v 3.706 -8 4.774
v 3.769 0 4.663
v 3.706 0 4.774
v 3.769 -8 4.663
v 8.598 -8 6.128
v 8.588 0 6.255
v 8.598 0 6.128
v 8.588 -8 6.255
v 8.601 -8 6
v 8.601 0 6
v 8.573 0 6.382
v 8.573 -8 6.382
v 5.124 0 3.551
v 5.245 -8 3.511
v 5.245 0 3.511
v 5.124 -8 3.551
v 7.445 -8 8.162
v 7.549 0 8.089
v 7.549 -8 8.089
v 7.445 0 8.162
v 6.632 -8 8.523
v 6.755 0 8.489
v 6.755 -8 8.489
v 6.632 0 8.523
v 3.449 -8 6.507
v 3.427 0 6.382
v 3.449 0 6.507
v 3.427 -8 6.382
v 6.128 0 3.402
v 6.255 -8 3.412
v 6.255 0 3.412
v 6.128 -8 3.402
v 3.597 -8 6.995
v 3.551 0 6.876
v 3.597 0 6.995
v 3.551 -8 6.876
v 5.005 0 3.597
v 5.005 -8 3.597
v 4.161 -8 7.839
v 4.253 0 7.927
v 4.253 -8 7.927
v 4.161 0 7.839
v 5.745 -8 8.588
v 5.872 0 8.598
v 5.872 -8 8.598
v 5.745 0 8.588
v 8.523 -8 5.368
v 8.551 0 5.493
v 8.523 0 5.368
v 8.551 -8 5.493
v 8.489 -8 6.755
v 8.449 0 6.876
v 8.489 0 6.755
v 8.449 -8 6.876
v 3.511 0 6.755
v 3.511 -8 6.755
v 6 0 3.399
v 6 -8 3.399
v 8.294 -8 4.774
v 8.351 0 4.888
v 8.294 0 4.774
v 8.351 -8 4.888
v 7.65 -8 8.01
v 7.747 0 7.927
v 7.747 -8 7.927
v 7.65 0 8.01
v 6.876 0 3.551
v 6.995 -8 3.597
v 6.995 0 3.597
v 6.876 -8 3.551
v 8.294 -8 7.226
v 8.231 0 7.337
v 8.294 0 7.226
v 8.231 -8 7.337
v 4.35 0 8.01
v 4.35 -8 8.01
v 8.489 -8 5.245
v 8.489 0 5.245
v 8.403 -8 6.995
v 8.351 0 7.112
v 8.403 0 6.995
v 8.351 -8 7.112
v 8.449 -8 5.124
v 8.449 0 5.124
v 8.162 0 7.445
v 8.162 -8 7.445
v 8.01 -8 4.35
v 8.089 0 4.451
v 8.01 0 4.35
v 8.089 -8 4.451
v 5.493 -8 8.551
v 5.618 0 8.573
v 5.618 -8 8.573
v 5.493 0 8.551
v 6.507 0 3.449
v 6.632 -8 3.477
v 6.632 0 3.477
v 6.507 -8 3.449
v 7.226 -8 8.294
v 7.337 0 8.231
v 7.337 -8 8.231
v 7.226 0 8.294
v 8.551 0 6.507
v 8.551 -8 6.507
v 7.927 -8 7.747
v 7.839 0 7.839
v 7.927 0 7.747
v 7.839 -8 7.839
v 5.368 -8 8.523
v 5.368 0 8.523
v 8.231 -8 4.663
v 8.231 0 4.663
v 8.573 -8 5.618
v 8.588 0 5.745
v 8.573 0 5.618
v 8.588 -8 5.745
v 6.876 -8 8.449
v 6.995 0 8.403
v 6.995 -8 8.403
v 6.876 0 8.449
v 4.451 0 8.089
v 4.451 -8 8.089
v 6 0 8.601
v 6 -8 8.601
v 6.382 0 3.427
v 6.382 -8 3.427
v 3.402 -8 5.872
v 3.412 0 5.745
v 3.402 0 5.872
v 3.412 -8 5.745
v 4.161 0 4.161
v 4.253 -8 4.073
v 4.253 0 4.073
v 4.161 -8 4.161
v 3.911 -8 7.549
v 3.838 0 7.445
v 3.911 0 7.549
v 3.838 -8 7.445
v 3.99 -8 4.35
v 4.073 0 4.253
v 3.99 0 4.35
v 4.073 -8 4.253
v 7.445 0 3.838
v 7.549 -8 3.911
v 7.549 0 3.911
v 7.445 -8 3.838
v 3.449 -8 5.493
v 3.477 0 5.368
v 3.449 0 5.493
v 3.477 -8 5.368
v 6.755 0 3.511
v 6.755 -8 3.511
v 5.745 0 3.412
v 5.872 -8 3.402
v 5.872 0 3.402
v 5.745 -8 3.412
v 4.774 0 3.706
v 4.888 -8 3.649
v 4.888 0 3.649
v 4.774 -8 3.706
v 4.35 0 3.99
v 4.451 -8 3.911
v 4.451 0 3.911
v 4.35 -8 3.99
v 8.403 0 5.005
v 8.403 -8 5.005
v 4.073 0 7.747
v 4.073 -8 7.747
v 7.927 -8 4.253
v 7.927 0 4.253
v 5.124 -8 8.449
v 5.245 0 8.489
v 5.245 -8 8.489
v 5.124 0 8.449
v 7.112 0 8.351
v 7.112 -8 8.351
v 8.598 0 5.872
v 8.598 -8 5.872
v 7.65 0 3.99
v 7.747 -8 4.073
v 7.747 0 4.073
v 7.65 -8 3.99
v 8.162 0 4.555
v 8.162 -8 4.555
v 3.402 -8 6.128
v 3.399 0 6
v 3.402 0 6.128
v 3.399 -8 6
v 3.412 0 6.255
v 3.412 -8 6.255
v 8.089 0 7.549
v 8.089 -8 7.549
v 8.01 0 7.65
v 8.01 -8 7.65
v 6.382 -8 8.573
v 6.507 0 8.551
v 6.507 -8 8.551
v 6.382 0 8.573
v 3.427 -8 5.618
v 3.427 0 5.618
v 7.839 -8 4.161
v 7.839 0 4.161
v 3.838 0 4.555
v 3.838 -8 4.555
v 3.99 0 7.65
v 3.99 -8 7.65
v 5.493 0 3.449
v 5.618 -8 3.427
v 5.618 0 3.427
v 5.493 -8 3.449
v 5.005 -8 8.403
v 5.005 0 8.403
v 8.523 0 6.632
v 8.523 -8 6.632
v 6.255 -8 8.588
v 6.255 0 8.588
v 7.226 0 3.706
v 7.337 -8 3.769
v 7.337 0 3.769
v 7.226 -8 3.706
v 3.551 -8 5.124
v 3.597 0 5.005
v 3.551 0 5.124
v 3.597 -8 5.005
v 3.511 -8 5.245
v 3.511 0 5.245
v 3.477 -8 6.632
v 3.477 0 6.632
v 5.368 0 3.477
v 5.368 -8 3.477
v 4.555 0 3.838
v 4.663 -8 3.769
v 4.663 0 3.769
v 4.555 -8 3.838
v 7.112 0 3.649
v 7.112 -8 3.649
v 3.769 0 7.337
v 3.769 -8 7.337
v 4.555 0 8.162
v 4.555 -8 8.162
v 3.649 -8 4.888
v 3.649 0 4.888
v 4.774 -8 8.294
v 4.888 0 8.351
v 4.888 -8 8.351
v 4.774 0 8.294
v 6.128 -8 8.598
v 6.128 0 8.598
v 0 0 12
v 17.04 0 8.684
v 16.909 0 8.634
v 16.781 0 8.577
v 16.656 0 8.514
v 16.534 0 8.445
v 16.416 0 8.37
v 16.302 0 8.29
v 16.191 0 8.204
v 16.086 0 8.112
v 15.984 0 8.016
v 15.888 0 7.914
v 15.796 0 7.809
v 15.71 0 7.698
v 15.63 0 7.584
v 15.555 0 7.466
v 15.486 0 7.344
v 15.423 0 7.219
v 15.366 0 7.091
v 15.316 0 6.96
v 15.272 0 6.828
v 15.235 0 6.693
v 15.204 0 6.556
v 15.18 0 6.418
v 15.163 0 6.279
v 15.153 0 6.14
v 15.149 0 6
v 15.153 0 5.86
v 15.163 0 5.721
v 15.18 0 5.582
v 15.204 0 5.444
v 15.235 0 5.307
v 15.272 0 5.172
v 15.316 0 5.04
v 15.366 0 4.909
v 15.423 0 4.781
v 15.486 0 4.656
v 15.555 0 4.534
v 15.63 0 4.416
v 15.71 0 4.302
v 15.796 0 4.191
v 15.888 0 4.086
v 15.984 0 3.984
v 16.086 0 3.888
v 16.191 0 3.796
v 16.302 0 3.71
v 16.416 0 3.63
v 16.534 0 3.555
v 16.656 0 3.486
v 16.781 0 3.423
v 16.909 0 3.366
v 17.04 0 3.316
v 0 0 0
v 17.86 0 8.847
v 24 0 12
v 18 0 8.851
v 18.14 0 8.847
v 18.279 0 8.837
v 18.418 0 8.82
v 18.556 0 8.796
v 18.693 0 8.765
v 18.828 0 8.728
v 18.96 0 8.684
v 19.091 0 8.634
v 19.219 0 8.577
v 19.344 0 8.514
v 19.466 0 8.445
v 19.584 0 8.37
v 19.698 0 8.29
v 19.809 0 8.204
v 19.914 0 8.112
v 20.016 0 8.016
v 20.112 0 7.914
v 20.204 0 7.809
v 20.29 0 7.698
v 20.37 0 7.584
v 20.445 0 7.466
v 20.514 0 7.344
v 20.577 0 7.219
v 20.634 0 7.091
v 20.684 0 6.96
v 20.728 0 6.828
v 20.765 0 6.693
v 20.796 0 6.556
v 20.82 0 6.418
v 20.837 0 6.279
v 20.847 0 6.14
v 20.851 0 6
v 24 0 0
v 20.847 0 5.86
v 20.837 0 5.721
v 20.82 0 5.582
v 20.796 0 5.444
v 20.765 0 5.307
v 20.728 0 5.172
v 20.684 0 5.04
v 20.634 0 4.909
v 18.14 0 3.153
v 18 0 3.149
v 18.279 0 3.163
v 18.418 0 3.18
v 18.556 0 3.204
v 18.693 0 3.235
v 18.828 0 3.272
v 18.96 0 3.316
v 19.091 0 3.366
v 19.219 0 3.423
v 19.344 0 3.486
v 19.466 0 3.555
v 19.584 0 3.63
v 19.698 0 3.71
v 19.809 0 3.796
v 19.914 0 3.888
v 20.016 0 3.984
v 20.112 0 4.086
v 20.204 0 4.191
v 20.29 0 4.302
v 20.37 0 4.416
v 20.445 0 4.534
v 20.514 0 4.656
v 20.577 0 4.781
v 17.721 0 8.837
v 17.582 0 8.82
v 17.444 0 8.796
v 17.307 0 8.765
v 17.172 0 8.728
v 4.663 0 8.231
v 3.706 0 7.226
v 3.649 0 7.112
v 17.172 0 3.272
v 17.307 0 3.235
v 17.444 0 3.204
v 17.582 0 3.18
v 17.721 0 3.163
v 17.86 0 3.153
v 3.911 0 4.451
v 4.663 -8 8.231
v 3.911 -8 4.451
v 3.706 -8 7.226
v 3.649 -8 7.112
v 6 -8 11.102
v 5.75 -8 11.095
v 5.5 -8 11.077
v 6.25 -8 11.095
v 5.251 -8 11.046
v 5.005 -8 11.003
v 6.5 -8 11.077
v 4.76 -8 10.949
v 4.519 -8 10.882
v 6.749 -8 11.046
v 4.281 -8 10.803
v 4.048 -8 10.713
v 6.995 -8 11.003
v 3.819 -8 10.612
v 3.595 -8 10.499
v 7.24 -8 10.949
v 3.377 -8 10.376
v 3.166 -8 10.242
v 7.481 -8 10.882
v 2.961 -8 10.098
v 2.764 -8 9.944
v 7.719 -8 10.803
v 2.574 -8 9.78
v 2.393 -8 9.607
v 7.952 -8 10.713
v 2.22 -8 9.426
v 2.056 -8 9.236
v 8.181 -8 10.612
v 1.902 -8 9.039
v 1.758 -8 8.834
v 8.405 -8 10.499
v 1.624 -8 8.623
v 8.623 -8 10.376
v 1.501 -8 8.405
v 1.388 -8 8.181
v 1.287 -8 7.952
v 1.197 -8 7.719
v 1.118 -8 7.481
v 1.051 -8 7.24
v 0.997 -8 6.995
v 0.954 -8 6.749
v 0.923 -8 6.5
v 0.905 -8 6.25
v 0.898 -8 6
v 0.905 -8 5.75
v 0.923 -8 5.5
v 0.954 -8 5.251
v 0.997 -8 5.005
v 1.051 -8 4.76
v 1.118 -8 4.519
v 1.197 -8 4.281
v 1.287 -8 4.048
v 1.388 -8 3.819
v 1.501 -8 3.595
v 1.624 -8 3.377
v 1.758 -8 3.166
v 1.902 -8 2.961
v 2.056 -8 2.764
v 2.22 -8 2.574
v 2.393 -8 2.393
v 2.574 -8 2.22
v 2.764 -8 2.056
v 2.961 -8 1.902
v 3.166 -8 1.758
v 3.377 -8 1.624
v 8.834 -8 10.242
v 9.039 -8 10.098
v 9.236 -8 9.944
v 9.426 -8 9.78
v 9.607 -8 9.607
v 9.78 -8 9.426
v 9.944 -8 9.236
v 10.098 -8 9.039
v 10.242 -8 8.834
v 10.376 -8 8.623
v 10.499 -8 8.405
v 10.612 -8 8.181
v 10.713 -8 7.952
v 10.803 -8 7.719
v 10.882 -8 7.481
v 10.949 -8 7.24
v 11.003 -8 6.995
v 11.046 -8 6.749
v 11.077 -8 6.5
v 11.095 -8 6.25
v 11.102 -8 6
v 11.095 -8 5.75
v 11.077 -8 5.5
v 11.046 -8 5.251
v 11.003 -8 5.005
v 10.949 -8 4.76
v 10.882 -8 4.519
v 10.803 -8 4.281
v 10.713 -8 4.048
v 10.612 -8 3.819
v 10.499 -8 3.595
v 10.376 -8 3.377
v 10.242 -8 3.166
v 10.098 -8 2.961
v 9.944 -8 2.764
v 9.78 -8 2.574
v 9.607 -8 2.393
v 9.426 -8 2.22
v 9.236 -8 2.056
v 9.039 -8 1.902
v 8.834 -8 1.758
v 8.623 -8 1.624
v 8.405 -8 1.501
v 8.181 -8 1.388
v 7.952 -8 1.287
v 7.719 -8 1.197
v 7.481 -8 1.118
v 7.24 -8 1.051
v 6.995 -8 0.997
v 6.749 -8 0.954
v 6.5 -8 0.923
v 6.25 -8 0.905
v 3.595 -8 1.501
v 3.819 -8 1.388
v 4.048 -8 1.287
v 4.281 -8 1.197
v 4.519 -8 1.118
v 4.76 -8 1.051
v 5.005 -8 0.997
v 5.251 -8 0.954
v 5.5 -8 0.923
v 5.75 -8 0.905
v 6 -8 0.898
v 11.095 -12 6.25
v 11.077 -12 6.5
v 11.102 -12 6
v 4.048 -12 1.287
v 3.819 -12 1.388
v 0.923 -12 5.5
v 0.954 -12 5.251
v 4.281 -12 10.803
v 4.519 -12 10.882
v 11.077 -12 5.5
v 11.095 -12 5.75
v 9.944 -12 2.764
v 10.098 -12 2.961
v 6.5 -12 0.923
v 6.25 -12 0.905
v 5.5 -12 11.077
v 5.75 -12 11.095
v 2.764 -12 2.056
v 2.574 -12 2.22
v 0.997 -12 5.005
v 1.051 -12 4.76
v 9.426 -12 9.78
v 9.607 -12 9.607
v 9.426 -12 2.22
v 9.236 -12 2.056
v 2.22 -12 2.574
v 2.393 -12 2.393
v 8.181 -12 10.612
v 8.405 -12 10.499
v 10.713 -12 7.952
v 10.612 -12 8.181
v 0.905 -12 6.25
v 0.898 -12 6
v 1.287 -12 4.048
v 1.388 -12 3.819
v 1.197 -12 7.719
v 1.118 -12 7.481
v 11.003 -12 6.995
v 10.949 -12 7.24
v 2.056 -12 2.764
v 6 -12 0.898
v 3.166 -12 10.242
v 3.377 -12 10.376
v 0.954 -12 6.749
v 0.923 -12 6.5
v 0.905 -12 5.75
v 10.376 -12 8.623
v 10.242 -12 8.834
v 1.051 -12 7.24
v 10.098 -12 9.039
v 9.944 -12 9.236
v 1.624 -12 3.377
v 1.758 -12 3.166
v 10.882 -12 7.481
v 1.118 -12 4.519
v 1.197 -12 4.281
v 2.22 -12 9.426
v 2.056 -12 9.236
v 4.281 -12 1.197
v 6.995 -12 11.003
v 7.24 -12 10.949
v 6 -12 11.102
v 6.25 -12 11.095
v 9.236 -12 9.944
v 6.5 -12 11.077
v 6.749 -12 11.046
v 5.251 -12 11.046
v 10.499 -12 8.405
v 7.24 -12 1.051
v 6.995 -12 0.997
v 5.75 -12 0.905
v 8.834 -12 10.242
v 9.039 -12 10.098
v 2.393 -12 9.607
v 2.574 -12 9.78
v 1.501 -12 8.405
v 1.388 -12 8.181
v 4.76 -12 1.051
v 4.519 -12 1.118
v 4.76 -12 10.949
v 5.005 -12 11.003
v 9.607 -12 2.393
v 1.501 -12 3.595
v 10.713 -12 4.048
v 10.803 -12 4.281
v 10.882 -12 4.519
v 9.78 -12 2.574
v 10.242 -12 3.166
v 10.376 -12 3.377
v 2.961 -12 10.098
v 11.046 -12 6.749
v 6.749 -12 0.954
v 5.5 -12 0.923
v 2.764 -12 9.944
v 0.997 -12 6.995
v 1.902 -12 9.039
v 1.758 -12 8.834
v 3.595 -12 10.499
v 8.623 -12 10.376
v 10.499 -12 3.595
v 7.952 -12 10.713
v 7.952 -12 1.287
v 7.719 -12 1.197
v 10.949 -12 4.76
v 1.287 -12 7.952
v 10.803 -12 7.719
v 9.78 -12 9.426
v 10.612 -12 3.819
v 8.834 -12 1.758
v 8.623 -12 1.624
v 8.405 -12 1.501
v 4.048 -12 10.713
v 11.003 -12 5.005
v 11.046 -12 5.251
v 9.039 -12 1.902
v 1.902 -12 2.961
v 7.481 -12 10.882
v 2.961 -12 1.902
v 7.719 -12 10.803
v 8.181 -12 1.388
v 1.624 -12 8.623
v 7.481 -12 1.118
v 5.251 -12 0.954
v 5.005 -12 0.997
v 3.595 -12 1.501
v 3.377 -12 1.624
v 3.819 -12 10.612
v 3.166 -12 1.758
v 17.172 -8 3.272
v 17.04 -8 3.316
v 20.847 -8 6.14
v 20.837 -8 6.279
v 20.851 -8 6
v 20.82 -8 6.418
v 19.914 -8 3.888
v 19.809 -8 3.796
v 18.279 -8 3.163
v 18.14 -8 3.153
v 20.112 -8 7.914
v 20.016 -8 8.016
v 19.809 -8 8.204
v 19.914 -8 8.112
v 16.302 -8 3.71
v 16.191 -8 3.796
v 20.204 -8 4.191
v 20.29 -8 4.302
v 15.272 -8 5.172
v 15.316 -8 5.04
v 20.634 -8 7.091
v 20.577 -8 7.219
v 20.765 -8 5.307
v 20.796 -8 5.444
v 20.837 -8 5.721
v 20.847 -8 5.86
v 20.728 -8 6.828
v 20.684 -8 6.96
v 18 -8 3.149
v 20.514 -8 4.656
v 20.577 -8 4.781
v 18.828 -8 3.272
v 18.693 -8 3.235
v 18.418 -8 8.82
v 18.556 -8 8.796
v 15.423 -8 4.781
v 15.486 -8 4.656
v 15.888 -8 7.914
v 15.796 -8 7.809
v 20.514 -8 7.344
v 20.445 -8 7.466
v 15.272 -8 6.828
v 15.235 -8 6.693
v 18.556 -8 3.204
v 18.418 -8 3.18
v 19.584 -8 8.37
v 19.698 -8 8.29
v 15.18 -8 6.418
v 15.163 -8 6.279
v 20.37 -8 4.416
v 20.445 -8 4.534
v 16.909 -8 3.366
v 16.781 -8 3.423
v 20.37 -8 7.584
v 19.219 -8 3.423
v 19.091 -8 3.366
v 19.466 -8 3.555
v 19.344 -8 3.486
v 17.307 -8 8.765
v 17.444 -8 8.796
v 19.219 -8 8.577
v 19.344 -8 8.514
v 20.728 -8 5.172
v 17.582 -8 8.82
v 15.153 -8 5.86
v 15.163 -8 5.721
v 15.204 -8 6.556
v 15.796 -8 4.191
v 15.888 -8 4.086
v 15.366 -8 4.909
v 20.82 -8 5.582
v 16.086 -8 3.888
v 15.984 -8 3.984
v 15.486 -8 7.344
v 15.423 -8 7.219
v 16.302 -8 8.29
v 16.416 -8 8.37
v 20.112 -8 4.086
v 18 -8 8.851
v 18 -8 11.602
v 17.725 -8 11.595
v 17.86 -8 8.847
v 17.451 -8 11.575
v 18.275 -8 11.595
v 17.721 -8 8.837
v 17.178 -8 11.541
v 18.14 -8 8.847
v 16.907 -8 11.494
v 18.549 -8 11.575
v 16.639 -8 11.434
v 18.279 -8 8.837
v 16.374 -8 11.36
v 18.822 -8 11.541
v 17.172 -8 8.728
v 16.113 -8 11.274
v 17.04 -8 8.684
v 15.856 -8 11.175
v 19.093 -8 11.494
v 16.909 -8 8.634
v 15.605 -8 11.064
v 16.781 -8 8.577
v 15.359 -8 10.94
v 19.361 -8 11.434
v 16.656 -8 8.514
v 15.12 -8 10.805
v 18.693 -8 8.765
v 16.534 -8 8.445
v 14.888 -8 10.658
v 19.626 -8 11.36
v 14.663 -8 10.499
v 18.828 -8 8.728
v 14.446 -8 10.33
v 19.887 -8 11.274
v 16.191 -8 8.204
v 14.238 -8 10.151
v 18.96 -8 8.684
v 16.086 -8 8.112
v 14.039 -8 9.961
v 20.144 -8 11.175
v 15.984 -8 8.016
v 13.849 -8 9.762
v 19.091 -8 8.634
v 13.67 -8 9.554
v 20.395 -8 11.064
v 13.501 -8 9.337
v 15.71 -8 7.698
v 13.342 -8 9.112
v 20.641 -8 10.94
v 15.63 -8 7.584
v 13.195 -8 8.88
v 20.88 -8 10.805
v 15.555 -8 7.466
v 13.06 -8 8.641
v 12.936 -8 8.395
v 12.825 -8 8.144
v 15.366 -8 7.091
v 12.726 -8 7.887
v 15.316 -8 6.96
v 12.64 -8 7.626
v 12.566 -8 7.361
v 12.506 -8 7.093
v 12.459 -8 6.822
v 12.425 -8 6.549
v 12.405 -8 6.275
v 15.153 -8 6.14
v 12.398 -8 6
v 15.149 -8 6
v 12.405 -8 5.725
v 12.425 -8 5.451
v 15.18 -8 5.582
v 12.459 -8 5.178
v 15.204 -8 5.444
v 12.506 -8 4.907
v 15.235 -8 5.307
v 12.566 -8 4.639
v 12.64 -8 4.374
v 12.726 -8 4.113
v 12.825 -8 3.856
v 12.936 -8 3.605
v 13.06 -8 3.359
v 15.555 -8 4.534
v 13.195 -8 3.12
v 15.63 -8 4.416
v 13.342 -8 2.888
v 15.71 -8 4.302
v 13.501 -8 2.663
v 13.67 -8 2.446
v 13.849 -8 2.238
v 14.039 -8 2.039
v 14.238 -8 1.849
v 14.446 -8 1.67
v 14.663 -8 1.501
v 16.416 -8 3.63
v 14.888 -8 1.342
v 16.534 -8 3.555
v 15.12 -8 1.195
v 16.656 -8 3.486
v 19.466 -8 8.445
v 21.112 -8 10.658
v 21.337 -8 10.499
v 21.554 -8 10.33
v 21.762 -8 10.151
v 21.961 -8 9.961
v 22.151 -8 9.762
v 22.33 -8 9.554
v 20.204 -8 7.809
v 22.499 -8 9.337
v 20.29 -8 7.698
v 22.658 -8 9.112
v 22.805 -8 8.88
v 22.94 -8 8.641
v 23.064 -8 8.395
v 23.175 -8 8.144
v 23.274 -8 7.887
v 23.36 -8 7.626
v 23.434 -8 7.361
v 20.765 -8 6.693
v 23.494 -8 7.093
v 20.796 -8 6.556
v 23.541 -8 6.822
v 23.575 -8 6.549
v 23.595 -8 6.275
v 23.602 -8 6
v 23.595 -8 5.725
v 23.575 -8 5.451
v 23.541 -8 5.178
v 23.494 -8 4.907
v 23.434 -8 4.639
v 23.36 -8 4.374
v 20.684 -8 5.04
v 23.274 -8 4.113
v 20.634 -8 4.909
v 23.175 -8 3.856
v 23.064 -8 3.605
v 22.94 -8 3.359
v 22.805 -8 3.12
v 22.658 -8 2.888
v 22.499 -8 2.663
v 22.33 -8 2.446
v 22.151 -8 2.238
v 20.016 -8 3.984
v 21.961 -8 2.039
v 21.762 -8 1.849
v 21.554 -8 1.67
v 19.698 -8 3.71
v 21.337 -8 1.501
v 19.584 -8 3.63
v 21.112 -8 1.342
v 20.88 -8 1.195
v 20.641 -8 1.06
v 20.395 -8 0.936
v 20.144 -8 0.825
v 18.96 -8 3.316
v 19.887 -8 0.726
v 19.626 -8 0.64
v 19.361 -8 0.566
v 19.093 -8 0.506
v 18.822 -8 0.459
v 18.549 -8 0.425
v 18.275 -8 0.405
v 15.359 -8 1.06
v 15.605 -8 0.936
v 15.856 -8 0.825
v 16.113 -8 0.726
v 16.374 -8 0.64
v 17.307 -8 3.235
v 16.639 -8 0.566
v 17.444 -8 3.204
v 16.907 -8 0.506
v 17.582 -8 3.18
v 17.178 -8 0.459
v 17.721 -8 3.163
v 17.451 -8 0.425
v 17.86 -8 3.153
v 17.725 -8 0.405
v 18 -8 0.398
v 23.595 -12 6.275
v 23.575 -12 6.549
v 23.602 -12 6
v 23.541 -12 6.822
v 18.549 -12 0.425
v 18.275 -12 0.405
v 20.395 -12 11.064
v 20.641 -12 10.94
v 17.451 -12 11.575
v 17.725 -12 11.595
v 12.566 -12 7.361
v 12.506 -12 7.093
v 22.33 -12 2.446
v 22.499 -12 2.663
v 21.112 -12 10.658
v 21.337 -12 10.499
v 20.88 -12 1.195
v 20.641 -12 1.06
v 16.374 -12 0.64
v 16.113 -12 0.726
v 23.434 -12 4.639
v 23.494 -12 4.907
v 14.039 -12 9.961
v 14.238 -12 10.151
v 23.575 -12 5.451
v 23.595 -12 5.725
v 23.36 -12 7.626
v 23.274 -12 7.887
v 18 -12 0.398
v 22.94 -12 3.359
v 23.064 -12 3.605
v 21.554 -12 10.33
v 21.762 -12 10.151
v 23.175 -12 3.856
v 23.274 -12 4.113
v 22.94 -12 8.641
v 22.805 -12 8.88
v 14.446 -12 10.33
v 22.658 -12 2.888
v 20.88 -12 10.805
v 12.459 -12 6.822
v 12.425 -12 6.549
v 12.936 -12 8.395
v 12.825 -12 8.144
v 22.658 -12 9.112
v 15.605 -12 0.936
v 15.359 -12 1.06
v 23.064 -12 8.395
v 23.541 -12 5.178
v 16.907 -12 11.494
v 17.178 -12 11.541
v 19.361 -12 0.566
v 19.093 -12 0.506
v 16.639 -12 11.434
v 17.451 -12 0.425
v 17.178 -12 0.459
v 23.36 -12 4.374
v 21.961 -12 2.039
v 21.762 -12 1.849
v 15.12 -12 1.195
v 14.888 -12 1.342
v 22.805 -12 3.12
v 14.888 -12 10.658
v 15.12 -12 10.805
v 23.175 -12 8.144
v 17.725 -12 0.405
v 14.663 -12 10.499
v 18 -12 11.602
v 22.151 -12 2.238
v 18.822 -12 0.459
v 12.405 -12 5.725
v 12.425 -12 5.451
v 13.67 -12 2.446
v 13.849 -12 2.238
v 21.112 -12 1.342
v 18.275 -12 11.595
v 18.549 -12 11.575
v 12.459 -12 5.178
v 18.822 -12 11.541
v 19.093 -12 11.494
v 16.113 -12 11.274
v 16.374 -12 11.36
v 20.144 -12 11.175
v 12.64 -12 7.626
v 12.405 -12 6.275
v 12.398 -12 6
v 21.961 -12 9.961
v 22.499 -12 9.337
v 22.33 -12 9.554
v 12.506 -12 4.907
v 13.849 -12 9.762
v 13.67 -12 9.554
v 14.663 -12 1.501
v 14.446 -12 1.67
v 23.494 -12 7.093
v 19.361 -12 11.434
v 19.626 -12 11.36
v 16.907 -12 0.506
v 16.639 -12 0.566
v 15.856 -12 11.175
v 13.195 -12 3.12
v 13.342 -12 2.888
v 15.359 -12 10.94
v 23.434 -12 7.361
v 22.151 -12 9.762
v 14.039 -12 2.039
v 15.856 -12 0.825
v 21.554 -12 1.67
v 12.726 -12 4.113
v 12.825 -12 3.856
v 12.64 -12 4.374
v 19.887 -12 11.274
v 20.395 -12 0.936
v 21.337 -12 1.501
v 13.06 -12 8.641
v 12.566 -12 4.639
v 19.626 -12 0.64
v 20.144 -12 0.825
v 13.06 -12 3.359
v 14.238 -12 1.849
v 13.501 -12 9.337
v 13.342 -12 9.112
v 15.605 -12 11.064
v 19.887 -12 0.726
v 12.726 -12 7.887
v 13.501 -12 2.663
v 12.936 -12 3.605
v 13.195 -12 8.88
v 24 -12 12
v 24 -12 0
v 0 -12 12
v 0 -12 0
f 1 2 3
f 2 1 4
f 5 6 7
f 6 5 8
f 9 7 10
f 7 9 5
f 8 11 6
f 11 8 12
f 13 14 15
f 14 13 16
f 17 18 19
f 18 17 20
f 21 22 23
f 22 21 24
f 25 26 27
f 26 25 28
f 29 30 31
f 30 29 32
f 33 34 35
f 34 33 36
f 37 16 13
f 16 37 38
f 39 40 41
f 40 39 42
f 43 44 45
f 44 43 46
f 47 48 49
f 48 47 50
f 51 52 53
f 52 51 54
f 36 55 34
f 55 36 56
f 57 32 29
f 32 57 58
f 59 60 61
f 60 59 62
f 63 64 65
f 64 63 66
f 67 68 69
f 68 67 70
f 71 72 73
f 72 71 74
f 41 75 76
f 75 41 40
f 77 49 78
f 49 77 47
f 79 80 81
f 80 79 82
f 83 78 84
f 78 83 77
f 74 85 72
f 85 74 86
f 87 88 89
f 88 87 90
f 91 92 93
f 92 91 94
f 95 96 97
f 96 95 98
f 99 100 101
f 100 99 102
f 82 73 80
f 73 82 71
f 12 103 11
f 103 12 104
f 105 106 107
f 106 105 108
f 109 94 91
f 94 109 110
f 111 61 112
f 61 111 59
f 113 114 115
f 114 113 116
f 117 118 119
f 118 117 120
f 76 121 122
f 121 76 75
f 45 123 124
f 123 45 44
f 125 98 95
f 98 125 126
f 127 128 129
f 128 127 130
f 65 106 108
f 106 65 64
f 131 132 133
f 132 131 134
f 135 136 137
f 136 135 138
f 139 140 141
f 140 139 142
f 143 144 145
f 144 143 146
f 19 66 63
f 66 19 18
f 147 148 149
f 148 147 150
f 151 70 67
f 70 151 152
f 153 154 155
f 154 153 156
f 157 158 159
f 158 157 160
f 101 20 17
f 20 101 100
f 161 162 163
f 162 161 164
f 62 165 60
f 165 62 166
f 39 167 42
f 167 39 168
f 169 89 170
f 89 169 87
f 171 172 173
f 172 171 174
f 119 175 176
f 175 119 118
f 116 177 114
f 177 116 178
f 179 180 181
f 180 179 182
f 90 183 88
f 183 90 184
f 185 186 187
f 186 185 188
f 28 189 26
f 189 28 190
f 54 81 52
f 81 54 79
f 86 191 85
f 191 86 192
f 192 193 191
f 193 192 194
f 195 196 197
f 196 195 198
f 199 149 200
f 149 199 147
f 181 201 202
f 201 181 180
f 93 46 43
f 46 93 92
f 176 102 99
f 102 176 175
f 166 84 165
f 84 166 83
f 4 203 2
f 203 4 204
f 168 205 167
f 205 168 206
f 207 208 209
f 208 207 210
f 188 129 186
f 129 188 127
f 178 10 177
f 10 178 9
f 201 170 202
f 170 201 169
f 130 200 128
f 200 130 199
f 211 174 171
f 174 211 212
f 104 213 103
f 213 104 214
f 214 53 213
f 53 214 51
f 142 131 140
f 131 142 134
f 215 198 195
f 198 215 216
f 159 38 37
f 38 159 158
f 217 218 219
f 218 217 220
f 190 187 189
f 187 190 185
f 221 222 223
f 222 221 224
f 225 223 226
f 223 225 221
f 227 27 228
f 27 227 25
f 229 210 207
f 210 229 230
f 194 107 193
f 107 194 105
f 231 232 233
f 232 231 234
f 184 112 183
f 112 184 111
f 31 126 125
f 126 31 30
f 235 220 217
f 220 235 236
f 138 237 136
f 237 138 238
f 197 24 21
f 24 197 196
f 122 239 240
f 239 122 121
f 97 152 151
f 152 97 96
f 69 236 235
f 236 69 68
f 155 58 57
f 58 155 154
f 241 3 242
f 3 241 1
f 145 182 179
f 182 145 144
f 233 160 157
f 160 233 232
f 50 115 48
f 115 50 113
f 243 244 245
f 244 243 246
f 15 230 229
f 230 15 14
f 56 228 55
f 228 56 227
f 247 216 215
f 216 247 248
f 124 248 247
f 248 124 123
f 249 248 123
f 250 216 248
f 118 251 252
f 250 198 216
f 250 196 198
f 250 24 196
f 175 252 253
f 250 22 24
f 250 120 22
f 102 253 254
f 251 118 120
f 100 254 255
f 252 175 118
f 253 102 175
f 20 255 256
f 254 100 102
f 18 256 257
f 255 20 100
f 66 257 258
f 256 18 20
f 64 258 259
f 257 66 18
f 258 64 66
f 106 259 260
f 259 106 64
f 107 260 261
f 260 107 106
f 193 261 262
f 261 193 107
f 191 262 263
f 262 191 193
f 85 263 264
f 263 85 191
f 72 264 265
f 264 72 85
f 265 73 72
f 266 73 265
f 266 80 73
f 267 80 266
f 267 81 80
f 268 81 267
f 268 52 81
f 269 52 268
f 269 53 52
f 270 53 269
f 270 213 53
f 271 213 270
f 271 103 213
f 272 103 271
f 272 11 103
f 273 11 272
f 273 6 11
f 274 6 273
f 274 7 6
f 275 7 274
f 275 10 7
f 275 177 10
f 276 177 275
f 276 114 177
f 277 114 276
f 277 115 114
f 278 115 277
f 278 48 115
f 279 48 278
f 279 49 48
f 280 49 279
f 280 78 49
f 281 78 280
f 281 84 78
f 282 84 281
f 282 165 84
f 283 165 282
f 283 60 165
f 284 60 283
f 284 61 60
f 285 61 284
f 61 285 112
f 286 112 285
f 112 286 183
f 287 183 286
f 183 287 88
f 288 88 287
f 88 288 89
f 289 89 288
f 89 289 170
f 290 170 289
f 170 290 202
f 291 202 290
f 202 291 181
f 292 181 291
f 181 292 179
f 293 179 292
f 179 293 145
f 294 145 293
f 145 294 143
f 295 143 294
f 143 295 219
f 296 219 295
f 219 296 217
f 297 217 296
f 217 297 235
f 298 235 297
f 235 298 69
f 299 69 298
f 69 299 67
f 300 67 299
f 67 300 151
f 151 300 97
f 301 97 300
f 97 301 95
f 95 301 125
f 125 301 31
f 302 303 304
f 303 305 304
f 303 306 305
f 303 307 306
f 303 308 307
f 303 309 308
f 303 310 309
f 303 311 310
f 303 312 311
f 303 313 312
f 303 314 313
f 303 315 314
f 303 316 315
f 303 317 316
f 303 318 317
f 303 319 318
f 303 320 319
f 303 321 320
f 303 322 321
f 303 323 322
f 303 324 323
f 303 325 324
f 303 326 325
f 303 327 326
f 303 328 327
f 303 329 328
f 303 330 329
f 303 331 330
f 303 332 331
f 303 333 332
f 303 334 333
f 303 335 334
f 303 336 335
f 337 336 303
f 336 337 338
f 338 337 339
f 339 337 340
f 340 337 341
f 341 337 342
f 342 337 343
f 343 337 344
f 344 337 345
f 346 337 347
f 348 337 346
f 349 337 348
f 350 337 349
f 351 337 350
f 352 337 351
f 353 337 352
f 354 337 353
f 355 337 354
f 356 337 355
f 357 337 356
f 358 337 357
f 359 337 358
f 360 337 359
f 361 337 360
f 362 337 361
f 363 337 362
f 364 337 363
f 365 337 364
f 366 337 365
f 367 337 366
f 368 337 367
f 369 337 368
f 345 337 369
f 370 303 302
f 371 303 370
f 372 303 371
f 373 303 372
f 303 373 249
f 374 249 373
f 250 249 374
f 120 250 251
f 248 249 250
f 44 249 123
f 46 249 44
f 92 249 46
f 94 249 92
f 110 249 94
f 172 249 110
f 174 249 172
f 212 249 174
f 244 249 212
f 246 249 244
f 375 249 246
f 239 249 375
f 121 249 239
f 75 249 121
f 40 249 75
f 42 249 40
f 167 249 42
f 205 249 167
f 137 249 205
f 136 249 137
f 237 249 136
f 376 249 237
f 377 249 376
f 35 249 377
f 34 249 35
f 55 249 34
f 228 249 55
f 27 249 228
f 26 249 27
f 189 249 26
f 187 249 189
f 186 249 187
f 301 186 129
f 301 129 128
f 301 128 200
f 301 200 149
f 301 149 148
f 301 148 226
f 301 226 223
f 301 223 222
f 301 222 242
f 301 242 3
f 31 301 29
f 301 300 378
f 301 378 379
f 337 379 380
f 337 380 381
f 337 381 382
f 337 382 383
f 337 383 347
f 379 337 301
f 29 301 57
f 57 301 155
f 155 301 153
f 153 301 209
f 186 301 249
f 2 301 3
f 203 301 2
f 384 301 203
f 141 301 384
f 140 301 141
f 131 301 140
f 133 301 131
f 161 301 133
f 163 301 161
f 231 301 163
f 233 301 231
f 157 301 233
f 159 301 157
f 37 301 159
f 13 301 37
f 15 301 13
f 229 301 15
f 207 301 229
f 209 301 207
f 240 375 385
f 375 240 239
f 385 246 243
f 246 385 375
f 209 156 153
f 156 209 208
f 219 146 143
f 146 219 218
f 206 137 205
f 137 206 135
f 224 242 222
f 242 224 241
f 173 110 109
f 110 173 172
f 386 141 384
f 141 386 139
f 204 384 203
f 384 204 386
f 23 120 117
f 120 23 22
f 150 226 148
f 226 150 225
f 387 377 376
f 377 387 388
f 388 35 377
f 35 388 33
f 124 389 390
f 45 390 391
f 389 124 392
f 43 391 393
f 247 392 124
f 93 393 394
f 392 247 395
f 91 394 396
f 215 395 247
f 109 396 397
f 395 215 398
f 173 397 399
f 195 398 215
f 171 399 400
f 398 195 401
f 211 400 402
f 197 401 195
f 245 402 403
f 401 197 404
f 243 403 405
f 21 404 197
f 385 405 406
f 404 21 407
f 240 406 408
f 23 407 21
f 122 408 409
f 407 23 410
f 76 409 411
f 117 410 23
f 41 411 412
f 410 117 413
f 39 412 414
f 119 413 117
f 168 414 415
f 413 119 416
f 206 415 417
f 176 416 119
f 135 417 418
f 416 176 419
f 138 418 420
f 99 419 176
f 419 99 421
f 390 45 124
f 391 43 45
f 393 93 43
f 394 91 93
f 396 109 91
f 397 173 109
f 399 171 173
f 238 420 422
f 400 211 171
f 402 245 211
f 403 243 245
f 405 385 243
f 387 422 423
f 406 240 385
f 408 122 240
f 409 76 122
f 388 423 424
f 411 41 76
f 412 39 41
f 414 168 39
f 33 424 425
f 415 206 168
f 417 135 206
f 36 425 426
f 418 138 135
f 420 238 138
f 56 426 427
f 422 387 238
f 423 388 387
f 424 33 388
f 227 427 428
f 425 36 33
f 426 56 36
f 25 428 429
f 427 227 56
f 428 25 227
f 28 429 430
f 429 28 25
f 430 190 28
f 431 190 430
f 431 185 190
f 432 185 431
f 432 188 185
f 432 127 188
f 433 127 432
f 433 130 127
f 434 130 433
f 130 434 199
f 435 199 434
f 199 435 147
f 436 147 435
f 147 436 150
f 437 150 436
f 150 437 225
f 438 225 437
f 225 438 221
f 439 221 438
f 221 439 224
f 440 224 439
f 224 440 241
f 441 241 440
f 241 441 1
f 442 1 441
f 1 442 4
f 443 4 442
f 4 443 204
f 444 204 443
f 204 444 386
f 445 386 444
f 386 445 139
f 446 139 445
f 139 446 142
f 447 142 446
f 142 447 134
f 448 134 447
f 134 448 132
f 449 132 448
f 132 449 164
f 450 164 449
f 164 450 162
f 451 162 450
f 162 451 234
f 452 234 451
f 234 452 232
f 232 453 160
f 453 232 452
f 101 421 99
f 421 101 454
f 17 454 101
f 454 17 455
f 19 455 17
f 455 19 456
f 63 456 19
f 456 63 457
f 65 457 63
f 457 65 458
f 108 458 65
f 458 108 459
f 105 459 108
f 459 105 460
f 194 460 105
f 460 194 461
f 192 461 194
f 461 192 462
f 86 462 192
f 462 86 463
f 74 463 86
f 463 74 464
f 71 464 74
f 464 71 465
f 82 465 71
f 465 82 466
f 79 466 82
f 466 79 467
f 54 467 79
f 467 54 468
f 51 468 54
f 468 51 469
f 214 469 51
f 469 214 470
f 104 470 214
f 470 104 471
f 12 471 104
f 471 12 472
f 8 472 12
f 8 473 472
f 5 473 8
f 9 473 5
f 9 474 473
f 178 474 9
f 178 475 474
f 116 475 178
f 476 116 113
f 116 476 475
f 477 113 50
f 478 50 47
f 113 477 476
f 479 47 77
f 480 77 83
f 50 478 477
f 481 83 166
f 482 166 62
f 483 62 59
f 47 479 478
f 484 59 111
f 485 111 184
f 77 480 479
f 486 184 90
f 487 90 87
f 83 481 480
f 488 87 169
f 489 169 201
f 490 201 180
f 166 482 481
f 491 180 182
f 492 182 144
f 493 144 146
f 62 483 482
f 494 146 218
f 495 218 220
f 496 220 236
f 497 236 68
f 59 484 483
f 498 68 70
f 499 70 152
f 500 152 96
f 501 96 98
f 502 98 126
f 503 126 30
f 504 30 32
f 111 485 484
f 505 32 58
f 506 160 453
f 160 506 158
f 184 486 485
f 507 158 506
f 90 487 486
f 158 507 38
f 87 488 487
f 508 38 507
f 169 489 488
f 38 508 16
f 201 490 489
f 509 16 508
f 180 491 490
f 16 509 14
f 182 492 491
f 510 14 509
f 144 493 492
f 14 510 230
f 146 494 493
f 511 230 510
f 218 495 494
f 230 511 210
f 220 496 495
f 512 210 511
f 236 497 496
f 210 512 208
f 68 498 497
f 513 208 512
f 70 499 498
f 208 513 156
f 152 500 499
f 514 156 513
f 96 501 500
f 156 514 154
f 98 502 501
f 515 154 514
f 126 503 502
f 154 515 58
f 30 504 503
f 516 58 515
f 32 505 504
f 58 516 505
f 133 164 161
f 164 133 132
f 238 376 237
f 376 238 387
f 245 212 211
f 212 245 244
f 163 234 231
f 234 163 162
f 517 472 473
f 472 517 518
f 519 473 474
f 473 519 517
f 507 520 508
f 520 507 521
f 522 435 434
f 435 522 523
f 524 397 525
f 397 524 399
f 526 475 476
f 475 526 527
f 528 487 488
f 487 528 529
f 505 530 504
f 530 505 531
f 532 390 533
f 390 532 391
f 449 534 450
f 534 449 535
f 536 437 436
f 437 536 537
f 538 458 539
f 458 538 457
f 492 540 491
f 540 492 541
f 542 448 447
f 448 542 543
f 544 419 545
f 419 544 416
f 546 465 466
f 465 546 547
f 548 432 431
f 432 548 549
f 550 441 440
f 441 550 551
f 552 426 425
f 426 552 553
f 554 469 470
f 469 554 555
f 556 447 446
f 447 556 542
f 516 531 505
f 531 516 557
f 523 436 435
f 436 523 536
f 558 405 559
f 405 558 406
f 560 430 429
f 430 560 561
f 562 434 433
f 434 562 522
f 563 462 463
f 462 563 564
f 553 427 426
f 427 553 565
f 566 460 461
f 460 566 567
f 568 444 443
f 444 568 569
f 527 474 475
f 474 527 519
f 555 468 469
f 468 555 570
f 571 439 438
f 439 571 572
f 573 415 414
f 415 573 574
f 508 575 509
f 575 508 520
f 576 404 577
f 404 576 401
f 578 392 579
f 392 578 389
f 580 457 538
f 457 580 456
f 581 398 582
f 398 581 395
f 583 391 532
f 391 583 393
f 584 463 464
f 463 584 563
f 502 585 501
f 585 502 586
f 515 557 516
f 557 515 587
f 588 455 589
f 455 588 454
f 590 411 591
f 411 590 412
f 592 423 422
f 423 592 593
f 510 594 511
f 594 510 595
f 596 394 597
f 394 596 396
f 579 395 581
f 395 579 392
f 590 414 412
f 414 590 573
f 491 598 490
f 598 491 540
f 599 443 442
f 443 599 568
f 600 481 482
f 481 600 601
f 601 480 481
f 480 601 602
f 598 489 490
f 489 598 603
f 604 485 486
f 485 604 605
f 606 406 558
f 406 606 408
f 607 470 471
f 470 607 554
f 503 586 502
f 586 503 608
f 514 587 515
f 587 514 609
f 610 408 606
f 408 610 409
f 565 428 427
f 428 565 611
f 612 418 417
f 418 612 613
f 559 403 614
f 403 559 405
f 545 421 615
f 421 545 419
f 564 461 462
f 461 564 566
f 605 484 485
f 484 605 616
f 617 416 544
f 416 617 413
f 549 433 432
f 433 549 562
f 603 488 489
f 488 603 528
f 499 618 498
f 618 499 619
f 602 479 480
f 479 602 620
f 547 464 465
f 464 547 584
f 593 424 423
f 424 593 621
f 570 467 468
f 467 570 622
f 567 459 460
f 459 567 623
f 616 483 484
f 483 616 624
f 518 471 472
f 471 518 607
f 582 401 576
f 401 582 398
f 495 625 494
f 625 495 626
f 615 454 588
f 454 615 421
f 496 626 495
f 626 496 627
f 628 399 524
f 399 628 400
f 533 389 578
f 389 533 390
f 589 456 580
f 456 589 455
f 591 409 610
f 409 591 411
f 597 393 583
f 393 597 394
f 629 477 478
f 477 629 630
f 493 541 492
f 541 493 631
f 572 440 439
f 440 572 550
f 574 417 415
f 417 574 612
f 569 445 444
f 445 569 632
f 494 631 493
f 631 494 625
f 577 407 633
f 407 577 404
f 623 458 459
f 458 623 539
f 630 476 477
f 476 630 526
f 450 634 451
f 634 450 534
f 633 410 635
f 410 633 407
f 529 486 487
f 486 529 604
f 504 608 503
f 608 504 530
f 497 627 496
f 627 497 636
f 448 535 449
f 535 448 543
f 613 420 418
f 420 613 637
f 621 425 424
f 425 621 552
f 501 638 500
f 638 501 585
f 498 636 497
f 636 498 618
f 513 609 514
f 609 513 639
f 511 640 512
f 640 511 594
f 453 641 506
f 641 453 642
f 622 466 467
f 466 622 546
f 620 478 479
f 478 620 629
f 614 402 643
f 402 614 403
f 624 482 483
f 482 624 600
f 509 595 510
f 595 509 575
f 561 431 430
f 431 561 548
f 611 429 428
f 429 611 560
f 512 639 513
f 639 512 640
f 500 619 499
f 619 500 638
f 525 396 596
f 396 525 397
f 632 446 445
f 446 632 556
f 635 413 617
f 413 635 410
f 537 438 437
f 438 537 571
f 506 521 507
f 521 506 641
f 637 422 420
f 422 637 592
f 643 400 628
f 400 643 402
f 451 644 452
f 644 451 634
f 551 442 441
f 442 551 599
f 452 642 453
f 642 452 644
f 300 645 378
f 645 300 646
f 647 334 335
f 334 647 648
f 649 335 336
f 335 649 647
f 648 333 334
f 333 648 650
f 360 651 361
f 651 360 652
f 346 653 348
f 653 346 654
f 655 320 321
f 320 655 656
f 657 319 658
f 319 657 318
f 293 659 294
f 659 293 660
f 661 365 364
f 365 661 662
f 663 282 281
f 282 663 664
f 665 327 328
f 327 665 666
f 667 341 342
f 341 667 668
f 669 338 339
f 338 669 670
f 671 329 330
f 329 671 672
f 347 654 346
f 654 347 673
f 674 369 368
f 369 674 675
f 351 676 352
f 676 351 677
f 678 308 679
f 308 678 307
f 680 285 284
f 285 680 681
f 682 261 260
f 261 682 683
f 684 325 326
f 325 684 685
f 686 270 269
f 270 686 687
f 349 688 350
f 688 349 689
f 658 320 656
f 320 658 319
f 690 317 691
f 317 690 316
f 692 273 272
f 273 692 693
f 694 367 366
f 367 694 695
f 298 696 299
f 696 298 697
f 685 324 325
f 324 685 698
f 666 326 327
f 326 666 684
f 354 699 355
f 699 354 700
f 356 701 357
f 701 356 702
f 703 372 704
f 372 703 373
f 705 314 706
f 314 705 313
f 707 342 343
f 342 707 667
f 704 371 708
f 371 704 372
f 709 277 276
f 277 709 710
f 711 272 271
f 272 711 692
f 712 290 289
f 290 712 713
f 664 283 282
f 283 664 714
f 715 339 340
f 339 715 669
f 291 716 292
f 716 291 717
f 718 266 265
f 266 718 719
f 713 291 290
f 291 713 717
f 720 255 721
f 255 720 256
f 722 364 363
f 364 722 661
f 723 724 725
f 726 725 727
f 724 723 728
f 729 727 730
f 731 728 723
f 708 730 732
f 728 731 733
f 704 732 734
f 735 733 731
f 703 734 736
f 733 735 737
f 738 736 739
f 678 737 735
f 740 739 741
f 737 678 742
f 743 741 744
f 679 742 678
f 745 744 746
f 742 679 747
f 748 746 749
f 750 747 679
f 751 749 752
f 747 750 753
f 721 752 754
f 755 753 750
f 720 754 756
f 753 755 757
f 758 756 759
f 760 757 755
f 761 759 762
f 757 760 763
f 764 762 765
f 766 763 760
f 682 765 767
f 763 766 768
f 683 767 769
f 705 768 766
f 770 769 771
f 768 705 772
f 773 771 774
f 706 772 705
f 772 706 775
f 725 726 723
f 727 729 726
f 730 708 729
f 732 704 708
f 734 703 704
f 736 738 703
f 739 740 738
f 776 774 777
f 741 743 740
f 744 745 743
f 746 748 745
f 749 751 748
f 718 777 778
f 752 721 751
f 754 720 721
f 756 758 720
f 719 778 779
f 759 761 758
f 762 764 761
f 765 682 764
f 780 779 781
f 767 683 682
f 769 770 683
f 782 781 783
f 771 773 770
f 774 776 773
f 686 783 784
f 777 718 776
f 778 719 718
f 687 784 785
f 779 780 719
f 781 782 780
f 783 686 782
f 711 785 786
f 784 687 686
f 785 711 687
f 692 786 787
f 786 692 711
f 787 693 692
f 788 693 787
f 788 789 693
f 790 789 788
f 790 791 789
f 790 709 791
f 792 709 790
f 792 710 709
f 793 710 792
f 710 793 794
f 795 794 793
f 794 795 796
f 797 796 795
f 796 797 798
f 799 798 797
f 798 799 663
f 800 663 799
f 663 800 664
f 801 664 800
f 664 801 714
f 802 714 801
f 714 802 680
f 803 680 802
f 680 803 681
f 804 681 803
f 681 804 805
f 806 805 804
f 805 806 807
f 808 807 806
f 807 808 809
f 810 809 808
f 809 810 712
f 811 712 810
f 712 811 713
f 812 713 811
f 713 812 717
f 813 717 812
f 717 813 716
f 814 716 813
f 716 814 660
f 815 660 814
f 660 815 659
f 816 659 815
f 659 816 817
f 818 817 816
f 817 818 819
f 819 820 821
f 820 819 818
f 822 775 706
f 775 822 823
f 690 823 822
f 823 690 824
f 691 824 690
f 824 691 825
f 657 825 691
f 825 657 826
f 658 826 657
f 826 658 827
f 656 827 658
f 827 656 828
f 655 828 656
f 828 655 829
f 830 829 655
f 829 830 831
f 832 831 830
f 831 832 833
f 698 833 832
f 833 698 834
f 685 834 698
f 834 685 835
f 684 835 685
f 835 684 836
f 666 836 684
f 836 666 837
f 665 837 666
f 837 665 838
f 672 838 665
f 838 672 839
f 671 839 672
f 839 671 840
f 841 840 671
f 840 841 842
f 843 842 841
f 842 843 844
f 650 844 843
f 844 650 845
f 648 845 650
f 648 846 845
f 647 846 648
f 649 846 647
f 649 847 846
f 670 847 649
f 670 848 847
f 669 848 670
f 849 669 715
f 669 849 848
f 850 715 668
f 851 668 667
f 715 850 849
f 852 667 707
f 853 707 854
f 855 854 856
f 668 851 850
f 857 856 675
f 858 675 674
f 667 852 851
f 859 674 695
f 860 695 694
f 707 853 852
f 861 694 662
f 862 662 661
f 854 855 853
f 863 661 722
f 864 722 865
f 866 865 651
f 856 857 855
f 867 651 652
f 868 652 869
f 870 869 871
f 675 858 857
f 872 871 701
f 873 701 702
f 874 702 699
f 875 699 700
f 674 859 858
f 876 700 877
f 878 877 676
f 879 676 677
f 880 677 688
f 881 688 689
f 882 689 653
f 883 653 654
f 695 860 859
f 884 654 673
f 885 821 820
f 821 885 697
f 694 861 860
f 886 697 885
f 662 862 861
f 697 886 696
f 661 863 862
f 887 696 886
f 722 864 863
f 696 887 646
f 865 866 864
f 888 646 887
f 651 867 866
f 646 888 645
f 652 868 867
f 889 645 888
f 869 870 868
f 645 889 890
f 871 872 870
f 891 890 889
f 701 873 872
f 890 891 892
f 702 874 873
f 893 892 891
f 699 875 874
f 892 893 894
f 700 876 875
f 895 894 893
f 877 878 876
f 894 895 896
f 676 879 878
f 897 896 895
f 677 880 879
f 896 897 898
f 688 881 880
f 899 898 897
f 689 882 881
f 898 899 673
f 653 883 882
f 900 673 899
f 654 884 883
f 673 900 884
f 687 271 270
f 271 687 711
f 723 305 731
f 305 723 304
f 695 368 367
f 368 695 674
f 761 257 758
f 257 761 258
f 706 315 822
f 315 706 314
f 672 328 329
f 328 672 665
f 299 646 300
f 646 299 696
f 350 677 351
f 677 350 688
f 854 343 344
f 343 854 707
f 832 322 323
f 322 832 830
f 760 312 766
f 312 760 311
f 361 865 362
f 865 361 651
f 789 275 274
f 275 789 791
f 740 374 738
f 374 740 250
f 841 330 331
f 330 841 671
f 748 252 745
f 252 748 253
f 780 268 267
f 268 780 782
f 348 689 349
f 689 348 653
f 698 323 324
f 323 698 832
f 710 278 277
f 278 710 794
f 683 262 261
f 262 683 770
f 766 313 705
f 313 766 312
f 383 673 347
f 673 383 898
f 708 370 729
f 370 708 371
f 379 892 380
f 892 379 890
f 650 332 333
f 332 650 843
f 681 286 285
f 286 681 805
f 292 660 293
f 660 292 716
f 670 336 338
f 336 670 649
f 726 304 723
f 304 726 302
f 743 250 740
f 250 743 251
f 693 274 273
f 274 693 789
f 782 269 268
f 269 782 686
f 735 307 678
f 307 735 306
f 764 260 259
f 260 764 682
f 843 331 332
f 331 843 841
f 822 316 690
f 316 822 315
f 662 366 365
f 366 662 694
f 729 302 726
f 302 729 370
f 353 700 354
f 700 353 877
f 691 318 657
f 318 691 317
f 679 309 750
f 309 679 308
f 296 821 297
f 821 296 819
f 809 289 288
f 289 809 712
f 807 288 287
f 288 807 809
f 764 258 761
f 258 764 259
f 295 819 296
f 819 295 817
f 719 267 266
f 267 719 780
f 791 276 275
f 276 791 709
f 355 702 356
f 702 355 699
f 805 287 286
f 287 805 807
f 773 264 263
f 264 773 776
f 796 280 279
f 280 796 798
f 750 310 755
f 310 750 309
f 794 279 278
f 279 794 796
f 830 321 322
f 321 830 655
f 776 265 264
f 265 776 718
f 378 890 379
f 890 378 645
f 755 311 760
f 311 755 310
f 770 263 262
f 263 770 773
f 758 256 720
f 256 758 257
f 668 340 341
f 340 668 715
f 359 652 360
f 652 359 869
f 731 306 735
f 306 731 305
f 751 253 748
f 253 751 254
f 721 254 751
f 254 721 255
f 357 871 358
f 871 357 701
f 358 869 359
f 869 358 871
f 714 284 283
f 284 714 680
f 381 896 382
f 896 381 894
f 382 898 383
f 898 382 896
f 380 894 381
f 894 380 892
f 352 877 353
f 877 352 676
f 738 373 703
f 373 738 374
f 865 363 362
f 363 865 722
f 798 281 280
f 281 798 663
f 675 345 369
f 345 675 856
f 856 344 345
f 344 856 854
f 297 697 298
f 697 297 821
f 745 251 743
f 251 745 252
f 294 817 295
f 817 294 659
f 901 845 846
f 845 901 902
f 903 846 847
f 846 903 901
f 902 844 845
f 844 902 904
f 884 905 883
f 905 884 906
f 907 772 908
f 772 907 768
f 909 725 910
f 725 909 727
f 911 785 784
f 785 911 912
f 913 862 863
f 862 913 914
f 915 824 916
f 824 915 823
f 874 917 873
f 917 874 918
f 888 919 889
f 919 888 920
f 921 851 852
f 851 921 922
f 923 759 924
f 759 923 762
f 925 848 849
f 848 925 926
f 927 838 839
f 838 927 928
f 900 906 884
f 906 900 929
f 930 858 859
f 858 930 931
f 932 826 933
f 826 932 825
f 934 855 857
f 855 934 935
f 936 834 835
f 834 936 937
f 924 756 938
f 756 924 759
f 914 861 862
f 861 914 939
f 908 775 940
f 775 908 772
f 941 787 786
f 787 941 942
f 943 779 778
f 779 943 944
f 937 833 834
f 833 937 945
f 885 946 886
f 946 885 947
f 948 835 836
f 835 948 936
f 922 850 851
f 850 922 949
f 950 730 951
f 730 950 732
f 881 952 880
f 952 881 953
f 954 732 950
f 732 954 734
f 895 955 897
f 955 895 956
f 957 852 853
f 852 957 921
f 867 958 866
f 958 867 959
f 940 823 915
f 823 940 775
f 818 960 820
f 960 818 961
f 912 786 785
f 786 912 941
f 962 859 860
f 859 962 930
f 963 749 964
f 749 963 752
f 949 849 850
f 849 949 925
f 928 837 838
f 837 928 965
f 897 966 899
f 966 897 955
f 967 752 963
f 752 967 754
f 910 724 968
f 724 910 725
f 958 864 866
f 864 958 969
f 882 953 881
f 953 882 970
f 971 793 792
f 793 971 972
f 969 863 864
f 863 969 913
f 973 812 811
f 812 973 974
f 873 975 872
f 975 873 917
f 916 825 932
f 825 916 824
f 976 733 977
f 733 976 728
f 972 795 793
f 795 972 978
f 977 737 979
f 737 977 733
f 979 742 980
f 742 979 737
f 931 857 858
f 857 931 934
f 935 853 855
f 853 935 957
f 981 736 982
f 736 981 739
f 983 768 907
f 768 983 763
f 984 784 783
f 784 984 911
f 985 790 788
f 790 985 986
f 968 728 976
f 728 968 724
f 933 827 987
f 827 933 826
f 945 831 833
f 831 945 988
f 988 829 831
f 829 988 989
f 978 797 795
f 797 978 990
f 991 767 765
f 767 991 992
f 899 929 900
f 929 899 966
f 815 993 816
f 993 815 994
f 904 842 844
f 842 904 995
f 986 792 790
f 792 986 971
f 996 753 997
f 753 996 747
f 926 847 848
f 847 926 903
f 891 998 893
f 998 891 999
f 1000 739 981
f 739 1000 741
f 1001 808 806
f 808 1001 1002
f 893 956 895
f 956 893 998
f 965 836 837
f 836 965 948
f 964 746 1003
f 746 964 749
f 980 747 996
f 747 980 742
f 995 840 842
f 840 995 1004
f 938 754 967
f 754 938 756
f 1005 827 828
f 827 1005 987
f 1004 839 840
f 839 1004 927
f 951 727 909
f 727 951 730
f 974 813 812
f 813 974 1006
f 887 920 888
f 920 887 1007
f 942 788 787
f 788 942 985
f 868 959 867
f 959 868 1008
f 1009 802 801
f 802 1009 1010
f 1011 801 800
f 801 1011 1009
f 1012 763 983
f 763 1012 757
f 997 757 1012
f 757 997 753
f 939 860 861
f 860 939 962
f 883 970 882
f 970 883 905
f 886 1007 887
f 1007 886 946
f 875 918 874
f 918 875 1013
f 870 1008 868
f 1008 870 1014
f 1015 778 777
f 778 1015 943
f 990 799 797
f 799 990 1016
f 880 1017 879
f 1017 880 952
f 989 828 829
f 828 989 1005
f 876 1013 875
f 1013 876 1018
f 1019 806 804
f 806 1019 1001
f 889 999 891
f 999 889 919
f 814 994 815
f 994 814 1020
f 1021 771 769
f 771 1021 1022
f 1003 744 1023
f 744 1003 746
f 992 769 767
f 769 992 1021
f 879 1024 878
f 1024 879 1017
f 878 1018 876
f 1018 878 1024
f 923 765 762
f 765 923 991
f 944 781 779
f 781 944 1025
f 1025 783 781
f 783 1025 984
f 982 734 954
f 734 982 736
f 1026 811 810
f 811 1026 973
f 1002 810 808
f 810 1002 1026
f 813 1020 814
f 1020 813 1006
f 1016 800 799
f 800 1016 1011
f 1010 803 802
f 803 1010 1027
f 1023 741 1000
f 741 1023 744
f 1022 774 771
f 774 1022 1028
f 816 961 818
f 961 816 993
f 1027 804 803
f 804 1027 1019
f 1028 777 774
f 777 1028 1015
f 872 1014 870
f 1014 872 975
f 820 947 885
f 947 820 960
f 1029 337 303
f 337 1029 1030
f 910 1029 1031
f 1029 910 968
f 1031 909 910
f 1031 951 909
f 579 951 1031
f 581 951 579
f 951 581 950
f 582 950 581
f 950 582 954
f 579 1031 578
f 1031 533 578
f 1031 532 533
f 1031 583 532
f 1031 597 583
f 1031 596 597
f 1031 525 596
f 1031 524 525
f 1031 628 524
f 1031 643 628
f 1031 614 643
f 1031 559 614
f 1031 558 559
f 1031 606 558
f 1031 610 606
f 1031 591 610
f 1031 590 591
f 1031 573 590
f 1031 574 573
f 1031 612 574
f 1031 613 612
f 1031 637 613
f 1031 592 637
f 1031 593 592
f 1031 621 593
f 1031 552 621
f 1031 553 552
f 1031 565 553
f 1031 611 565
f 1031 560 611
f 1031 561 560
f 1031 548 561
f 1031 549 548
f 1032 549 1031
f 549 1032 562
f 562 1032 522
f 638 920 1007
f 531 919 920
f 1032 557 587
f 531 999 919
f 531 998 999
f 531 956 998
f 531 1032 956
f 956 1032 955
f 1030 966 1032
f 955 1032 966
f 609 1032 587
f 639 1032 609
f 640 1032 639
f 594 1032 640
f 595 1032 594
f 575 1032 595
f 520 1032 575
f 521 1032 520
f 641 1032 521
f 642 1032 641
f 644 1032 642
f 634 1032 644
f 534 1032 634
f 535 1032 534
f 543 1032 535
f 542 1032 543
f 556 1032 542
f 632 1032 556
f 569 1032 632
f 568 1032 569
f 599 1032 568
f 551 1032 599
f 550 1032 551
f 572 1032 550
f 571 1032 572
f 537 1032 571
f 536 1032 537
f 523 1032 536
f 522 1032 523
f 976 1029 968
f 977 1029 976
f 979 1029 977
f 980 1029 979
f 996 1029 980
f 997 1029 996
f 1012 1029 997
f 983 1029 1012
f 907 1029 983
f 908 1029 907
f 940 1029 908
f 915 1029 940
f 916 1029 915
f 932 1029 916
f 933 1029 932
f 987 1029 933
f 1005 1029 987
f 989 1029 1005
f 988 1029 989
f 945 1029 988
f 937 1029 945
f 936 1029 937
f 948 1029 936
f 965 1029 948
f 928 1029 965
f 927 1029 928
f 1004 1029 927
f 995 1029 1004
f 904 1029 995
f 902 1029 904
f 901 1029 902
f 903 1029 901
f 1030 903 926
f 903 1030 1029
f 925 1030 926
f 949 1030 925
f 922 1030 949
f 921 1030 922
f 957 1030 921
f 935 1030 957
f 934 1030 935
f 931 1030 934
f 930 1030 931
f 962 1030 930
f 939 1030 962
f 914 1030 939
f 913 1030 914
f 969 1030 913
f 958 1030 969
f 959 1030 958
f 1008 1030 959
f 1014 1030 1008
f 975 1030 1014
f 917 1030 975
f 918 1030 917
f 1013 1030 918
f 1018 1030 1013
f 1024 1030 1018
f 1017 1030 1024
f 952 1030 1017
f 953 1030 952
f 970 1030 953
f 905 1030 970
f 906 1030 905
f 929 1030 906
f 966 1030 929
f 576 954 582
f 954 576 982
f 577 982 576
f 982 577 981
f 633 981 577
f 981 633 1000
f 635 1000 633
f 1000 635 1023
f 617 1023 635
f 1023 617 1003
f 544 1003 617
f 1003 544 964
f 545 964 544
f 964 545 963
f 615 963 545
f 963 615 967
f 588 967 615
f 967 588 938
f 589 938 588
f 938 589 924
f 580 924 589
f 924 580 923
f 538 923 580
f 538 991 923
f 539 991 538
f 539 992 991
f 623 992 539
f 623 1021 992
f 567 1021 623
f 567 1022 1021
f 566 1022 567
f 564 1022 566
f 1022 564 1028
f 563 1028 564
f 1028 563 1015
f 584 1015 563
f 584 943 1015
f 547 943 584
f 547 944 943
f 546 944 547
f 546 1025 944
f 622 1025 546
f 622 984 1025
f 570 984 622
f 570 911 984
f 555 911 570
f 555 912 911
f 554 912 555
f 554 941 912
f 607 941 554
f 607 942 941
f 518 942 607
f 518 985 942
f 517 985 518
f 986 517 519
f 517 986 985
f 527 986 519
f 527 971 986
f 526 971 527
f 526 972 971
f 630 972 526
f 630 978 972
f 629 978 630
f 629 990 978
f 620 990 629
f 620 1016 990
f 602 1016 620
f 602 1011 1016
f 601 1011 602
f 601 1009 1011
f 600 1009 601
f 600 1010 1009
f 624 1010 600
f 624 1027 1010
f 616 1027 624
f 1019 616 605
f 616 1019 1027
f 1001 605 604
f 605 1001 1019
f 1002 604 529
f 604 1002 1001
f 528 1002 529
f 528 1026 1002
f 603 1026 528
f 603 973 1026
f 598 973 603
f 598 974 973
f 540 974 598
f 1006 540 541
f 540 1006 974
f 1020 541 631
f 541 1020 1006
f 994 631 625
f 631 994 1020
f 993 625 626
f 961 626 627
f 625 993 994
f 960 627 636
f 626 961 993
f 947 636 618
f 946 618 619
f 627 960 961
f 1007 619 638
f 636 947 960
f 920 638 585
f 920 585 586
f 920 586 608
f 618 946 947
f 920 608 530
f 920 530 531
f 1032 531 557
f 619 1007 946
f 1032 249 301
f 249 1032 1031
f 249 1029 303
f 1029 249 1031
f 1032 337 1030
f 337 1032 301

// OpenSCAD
$fn = $preview ? 24 : 128;
RADIAL_ERROR = 0.1;

ISO262_COARSE_PITCH = [
	[1.0, 0.25],
	[1.2, 0.25],
	[1.4, 0.2],
	[1.6, 0.35],
	[1.8, 0.2],
	[2.0, 0.4],
	[2.5, 0.45],
	[3.0, 0.5],
	[3.5, 0.35],
	[4.0, 0.7],
	[5.0, 0.8],
	[6.0, 1.0],
	[7.0, 0.75],
	[8.0, 1.25],
	[10.0, 1.5],
	[12.0, 1.75],
	[14.0, 1.5],
	[16.0, 2.0],
	[30.0, 3.5],
	[42.0, 4.5],
	[56.0, 5.5]
];

function screw_pitch(d) = lookup(d, ISO262_COARSE_PITCH);

function fudge_factor(fn) = 1/cos(180/fn);
function outer_radius(radius, fn=$fn, radial_error=RADIAL_ERROR) = radius*fudge_factor(fn)+radial_error;

module sphere_outer(radius, radial_error=RADIAL_ERROR) {
	sphere(r=radius*fudge_factor($fn)+radial_error);
}

module cylinder_outer(height, radius, radial_error=RADIAL_ERROR) {
	cylinder(h=height,r=radius*fudge_factor($fn)+radial_error);
}

module cylinder_inner(height, radius, radial_error=RADIAL_ERROR) {
	cylinder(h=height,r=radius-radial_error);
}

// Make a hole. The diameter is the size of the screw (e.g. 3 for M3). Depth is how far the hole should go for the thread, and inset is how far out there should be a hole for the head to go.
module hole(diameter=3, depth=6, inset=10, pitch=0) {
	cylinder_outer(depth, (diameter-pitch)/2);
	
	if (inset) {
		translate([0, 0, depth]) cylinder_outer(inset, diameter);
	}
}

module threaded_hole(diameter=3, depth=6, inset=10) {
	hole(diameter, depth, inset, screw_pitch(diameter));
}

module screw_hole(diameter = 3, depth = 16, inset = 10, thickness = 6) {
	insert = depth - thickness;
	pitch = screw_pitch(diameter);
	
	// The part that the screw will thread into:
	cylinder_outer(insert, (diameter-pitch)/2);
	
	translate([0, 0, insert])
	hole(diameter, depth - insert, inset);
}

module countersunk_screw_hole(diameter = 3, depth = 16, inset = 10, thickness = 6) {
	insert = depth - thickness;
	pitch = screw_pitch(diameter);
	
	// The part that the screw will thread into:
	cylinder_outer(insert, (diameter-pitch)/2);
	
	translate([0, 0, insert])
	countersunk_hole(diameter, depth - insert, inset);
}

module countersunk_hole(diameter=3, depth=6, inset=10, pitch=0, radial_error=RADIAL_ERROR) {
	hole(diameter, depth, inset, pitch);
	translate([0, 0, depth-diameter/2]) cylinder(r1=diameter/2+radial_error, r2=diameter+radial_error, h=diameter/2);
}

module knurled_insert(diameter = 3, depth = 6, thickness = 1) {
	cylinder_inner(depth, diameter/2 + thickness);
}

module knurled_hole(diameter = 3, depth = 6, inset = 10, insert = 4, thickness = 1) {
	hole(diameter, depth, inset);
	
	knurled_insert(diameter, insert, thickness);
}

module countersunk_knurled_hole(diameter = 3, depth = 6, inset = 10, insert = 4, thickness = 1) {
	countersunk_hole(diameter, depth, inset);
	
	knurled_insert(diameter, insert, thickness);
}

// Make a hole for a bolt/screw combination.
module bolted_hole(diameter=3, depth=8, nut_offset=2, shaft_length=10, inset=10) {
	hole(diameter, depth, inset);
	hull() {
		shaft_width = diameter;
		translate([0, 0, nut_offset]) rotate(360/12, [0, 0, 1]) cylinder_outer(diameter, shaft_width, 6);
		translate([0, shaft_length, nut_offset]) rotate(360/12, [0, 0, 1]) cylinder_outer(diameter, shaft_width, 6);
	}
}

module countersunk_bolted_hole(diameter=3, depth=8, nut_offset=2, shaft_length=10, inset=10) {
	countersunk_hole(diameter, depth, inset);
	hull() {
		shaft_width = diameter;
		translate([0, 0, nut_offset]) rotate(360/12, [0, 0, 1]) cylinder_outer(diameter, shaft_width, 6);
		translate([0, shaft_length, nut_offset]) rotate(360/12, [0, 0, 1]) cylinder_outer(diameter, shaft_width, 6);
	}
}

module mounting_hole(diameter=3, depth=6, inset=10, outset=3) {
	difference() {
		cylinder_outer(depth, diameter/2+outset);
		hole(diameter=diameter, depth=depth, inset=inset);
	}
}

render() rotate(90, [1, 0, 0]) difference() {
	cube([40, 10, 10]);
	translate([5, 5, 0]) screw_hole();
}

render() rotate(90, [1, 0, 0]) difference() {
	cube([40, 10, 10]);
	translate([5, 5, 0]) bolted_hole(diameter=3, depth=8);
	translate([15, 5, 0]) bolted_hole(diameter=4, depth=8);
	translate([25, 5, 0]) countersunk_hole(diameter=4, depth=8);
	translate([35, 5, 0]) knurled_hole();
}

!render() rotate(90, [1, 0, 0]) difference() {
	cube([6*4, 12, 12]);
	translate([6, 6, 0]) hole(diameter=5, depth=8);
	translate([6*3, 6, 0]) hole(diameter=5.5, depth=8);
}
